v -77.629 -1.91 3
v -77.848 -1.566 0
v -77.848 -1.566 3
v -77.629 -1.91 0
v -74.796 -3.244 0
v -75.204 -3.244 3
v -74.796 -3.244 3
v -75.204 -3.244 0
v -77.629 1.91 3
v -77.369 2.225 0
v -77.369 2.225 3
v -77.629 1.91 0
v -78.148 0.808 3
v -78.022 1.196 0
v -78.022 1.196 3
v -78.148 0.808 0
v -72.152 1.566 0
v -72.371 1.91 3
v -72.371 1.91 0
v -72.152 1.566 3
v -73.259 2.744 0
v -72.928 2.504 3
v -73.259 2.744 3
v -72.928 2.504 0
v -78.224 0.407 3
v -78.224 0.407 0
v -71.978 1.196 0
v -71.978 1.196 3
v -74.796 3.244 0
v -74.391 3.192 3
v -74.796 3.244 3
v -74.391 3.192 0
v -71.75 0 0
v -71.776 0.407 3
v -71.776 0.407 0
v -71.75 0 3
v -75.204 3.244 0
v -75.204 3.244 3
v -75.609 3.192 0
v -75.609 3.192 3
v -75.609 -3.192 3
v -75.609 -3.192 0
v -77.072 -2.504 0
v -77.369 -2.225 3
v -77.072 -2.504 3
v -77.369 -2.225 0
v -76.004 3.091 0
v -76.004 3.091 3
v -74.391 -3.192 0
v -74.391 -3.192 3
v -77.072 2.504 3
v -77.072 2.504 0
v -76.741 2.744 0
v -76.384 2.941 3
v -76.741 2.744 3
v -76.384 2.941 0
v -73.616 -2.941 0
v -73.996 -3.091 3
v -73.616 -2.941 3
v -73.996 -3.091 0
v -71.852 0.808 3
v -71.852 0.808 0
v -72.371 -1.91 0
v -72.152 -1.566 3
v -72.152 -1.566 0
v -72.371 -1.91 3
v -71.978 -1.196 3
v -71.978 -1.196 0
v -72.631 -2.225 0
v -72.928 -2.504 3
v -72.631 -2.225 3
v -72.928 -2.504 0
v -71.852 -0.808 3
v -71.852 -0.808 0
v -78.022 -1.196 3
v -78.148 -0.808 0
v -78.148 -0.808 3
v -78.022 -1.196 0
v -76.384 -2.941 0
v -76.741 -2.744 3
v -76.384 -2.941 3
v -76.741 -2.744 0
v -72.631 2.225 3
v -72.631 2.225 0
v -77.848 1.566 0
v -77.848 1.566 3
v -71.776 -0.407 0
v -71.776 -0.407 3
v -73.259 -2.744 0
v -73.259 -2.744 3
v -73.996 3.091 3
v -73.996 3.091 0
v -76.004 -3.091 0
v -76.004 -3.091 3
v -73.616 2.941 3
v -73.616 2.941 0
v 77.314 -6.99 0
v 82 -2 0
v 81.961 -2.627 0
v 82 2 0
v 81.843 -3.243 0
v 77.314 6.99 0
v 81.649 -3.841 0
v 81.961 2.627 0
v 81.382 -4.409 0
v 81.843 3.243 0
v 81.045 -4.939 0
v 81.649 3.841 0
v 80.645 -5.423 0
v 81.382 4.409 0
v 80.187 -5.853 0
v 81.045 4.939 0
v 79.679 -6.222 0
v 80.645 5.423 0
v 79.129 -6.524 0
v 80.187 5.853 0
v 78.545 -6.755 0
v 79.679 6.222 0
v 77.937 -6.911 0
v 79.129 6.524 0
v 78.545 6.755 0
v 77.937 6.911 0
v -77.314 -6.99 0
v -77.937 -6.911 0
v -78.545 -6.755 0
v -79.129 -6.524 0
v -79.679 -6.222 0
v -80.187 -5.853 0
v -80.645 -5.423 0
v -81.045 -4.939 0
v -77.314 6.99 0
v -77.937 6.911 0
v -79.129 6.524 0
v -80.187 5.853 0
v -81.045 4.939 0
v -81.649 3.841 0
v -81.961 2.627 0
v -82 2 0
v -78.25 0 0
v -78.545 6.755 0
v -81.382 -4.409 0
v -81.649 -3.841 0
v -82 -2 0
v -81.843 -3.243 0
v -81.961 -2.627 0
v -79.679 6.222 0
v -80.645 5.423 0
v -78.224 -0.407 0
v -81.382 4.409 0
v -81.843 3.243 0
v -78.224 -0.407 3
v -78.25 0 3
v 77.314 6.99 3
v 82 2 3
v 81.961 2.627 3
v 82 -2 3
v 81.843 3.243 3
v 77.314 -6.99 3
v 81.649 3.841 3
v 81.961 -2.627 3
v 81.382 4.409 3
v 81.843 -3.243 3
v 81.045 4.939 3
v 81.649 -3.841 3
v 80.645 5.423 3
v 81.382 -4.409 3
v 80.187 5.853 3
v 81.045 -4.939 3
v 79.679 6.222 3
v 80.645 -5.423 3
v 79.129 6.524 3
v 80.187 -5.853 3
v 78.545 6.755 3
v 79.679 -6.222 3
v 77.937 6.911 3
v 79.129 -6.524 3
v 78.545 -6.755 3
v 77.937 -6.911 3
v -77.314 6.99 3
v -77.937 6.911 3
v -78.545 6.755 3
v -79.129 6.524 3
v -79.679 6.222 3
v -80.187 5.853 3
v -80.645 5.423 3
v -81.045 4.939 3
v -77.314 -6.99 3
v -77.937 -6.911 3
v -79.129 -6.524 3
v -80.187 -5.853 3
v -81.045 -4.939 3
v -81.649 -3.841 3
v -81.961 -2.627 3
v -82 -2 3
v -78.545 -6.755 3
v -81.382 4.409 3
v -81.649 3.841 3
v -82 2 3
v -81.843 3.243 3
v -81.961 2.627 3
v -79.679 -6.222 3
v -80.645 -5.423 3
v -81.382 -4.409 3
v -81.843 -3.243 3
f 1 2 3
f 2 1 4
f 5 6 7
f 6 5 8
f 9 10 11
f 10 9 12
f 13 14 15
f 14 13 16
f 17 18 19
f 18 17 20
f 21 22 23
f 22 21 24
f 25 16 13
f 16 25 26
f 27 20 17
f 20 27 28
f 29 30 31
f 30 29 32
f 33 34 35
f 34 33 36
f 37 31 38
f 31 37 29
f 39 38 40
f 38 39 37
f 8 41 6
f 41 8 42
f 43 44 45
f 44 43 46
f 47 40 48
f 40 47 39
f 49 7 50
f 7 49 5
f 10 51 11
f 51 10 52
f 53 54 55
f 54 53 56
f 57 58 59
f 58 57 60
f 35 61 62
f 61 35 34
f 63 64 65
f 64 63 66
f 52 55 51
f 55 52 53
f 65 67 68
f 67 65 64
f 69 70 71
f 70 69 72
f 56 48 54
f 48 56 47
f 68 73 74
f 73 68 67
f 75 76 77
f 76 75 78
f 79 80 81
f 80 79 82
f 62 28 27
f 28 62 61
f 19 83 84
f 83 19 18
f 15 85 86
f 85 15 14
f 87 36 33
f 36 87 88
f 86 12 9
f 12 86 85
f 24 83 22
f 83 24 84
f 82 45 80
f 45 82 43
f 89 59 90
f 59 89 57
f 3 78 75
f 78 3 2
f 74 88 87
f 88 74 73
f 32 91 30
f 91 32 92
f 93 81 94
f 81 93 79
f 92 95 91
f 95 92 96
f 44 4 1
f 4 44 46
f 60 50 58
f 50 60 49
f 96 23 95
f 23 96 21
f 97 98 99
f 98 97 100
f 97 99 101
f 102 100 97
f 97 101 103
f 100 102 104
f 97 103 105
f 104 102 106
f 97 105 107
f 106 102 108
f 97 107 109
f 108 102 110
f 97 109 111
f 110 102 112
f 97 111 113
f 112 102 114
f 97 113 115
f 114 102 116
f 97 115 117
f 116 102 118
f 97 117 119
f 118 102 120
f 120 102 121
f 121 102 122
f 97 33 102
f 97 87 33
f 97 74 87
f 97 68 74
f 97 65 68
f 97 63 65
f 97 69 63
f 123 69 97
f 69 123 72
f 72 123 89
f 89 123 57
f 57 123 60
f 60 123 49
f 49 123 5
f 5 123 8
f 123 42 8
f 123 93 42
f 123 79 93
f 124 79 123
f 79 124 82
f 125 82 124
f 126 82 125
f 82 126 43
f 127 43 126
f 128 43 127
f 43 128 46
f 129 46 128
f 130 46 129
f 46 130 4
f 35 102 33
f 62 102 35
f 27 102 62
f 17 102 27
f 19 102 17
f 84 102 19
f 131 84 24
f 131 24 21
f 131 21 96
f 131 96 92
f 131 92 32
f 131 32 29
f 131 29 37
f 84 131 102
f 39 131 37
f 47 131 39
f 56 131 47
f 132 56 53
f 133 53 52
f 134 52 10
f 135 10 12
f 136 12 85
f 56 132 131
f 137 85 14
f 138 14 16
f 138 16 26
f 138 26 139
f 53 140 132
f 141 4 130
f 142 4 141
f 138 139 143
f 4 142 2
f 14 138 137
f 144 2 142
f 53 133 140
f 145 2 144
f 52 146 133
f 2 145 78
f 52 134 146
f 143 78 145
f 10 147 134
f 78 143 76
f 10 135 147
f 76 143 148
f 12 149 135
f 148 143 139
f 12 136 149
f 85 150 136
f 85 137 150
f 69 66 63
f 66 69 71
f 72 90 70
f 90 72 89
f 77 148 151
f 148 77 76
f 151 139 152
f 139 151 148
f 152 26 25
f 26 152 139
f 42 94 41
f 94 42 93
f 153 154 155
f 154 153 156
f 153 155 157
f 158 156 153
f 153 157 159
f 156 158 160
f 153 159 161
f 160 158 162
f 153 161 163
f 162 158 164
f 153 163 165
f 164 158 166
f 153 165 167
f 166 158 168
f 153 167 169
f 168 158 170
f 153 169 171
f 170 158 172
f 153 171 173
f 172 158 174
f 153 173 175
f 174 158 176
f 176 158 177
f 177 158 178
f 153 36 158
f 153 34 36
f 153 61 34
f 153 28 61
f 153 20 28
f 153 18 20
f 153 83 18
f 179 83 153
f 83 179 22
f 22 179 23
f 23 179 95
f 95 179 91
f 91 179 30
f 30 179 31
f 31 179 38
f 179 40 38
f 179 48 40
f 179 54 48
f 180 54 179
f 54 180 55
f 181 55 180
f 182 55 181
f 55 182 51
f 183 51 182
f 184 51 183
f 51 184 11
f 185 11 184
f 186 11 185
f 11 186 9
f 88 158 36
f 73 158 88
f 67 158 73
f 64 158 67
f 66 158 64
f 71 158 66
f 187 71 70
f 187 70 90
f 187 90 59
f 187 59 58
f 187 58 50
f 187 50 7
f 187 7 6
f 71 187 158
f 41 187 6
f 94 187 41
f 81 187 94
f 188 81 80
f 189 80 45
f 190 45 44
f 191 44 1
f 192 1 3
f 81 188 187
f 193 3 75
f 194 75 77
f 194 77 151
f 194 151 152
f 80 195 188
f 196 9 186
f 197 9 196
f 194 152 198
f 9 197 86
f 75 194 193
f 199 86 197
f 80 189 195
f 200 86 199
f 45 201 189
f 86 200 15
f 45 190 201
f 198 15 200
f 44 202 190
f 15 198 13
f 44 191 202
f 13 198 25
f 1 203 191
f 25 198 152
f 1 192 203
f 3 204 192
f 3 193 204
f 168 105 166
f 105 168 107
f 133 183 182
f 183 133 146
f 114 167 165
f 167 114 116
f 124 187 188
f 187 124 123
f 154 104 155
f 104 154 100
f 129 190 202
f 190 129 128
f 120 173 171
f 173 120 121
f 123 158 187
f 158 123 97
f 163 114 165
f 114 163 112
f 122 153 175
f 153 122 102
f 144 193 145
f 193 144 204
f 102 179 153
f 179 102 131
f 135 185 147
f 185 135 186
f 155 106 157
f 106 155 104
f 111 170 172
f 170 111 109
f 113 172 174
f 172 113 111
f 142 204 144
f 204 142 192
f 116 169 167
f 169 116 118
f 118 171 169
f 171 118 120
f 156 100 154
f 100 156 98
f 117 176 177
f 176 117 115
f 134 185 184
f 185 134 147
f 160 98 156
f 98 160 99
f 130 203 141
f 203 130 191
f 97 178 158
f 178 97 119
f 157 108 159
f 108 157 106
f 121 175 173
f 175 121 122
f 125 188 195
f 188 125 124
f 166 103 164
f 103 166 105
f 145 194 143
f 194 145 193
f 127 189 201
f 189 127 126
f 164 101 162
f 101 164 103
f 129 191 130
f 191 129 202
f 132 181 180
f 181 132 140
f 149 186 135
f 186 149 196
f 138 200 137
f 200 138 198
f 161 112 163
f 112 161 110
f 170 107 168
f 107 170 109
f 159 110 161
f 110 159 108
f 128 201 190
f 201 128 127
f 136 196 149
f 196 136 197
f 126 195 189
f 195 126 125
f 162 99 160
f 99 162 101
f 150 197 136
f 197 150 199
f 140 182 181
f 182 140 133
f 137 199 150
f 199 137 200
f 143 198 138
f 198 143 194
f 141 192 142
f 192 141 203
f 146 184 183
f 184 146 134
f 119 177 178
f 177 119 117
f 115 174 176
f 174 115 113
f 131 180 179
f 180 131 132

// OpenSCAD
$fn = 50;


difference() {
	union() {
		hull() {
			translate(v = [-77.0000000000, 2.0000000000, 0]) {
				cylinder(h = 3, r = 5);
			}
			translate(v = [77.0000000000, 2.0000000000, 0]) {
				cylinder(h = 3, r = 5);
			}
			translate(v = [-77.0000000000, -2.0000000000, 0]) {
				cylinder(h = 3, r = 5);
			}
			translate(v = [77.0000000000, -2.0000000000, 0]) {
				cylinder(h = 3, r = 5);
			}
		}
	}
	union() {
		translate(v = [-75.0000000000, 0.0000000000, 0]) {
			cylinder(h = 3, r = 3.2500000000);
		}
		translate(v = [-75.0000000000, 0.0000000000, 0]) {
			cylinder(h = 3, r = 1.8000000000);
		}
		translate(v = [-75.0000000000, 0.0000000000, 0]) {
			cylinder(h = 3, r = 1.8000000000);
		}
		translate(v = [-75.0000000000, 0.0000000000, 0]) {
			cylinder(h = 3, r = 1.8000000000);
		}
	}
}
